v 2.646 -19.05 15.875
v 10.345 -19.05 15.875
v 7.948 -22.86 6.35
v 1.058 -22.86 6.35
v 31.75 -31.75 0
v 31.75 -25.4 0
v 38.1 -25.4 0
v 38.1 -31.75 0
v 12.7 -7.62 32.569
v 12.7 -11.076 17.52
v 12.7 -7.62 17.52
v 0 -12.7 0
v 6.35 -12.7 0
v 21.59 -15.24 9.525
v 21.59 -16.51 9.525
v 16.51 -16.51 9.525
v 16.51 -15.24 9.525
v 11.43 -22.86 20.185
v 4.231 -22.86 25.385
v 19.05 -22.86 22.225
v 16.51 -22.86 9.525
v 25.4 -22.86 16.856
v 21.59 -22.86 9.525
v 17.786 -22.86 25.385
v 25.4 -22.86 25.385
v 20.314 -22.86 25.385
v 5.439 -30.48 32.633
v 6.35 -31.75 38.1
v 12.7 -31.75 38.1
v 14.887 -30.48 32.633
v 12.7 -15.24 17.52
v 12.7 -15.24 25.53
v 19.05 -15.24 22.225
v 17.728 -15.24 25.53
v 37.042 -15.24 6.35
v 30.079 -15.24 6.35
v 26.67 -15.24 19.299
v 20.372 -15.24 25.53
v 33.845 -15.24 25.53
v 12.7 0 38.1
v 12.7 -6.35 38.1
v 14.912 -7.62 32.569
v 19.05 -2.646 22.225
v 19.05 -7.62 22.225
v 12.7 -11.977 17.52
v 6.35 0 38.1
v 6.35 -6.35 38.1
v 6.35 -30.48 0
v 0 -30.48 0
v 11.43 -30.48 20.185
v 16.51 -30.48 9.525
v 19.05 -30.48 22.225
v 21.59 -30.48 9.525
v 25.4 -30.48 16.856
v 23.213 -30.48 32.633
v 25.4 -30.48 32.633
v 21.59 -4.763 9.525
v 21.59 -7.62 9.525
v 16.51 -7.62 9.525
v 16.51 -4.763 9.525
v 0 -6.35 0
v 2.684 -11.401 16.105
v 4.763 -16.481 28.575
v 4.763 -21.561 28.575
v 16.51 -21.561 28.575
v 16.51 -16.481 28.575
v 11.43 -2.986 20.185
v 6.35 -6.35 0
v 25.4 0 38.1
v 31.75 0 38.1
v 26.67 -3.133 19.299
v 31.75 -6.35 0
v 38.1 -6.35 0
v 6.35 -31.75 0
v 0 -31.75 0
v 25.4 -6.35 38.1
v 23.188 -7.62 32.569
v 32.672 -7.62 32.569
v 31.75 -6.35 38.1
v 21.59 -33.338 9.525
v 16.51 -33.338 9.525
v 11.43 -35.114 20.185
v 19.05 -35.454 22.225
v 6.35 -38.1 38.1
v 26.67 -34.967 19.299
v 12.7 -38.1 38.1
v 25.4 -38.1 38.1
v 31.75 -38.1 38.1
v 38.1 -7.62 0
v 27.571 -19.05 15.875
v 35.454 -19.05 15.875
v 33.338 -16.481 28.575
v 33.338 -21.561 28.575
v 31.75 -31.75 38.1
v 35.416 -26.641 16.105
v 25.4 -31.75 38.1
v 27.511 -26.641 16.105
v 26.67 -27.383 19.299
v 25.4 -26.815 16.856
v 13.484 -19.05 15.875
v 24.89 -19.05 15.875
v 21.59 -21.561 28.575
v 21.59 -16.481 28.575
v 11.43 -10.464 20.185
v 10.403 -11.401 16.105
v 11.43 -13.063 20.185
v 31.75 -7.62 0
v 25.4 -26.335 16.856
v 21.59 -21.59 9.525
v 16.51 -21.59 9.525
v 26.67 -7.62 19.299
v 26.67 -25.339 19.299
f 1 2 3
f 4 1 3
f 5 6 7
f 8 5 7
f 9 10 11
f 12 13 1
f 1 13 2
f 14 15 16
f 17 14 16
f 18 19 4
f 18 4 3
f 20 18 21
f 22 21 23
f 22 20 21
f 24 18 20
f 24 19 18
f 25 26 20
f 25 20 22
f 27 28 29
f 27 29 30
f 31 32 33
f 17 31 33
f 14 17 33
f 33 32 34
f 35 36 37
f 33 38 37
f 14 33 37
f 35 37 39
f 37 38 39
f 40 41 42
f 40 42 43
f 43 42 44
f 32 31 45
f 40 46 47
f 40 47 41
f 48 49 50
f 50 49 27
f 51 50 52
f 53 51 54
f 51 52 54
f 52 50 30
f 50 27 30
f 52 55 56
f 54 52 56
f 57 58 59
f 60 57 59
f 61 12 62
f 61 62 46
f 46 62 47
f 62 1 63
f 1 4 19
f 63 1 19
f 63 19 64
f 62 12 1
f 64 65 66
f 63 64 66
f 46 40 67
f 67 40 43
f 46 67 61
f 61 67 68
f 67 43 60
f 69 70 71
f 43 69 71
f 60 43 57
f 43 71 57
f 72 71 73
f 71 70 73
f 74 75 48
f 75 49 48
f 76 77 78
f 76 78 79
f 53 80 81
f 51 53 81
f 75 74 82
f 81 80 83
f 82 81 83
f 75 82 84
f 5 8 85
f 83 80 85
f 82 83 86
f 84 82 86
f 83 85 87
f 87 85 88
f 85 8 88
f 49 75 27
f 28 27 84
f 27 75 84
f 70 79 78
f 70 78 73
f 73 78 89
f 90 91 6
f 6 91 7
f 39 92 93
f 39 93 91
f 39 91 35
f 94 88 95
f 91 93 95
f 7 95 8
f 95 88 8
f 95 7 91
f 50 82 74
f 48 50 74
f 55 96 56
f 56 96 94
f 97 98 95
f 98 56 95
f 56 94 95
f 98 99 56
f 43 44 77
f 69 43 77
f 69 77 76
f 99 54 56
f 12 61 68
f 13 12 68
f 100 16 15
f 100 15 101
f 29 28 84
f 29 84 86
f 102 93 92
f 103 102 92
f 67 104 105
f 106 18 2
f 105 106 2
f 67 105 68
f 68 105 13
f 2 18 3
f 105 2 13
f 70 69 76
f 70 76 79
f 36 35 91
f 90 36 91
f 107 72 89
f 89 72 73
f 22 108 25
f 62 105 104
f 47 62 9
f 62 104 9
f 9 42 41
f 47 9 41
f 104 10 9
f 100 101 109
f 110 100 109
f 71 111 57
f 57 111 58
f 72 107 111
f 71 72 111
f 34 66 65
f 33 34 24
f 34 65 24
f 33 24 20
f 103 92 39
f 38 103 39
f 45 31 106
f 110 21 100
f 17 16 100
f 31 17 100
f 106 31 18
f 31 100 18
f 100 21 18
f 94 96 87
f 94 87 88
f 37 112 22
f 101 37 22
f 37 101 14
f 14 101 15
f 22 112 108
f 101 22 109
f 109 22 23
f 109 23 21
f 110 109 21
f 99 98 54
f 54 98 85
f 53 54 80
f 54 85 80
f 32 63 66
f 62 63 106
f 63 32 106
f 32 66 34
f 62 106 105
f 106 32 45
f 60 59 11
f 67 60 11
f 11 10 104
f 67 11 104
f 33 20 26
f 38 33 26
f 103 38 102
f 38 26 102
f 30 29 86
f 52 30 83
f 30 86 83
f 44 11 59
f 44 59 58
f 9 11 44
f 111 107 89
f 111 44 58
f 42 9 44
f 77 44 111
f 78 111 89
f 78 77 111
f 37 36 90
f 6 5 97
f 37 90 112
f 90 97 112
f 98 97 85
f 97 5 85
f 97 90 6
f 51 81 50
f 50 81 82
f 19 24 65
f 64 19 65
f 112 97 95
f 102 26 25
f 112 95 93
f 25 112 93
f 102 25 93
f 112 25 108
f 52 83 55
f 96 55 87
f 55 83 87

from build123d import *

# Parameters (mm, degrees)
F0_W      = 38.1
F0_H      = 38.1
F1_DEPTH  = 38.1
F6_DEPTH  = 38.1
F8_DEPTH  = 38.1
F9_W      = 25.4
F9_H      = 7.62
F10_DEPTH = 38.1


with BuildPart() as f1:
    # F0 (on Front) → F1 (new body)
    with BuildSketch(Plane.XZ):
        with Locations((19.05, 19.05)):
            Rectangle(F0_W, F0_H)
    extrude(amount=F1_DEPTH)

    # F5 (on offset) → F6 (cut)
    with BuildSketch(Plane.YZ.offset(38.1)):
        Polygon((-11.400602, 16.104914), (-6.35, 38.1), (-31.75, 38.1), (-26.640602, 16.104914), (-21.560602, 28.575), (-16.480602, 28.575), align=None)
        Polygon((-6.35, 0), (0, 0), (0, 38.1), align=None)
        Polygon((-25.4, 0), (-12.7, 0), (-19.05, 15.875), align=None)
        Polygon((-38.1, 0), (-31.75, 0), (-38.1, 38.1), align=None)
    extrude(amount=-F6_DEPTH, mode=Mode.SUBTRACT)

    # F7 (on offset) → F8 (cut)
    with BuildSketch(Plane.XZ.offset(38.1)):
        Polygon((0, 38.1), (0, 0), (6.35, 38.1), align=None)
        Polygon((25.4, 38.1), (12.7, 38.1), (19.05, 22.225), align=None)
        Polygon((31.75, 38.1), (38.1, 0), (38.1, 38.1), align=None)
        Polygon((11.43, 20.184822), (6.35, 0), (31.75, 0), (26.67, 19.299196), (21.59, 9.525), (16.51, 9.525), align=None)
    extrude(amount=-F8_DEPTH, mode=Mode.SUBTRACT)

    # F9 (on offset) → F10 (cut)
    with BuildSketch(Plane.XY.offset(38.1)):
        with Locations((12.7, -26.67)):
            Rectangle(F9_W, F9_H)
        with Locations((25.4, -11.43)):
            Rectangle(F9_W, F9_H)
    extrude(amount=-F10_DEPTH, mode=Mode.SUBTRACT)


solid = f1.part
